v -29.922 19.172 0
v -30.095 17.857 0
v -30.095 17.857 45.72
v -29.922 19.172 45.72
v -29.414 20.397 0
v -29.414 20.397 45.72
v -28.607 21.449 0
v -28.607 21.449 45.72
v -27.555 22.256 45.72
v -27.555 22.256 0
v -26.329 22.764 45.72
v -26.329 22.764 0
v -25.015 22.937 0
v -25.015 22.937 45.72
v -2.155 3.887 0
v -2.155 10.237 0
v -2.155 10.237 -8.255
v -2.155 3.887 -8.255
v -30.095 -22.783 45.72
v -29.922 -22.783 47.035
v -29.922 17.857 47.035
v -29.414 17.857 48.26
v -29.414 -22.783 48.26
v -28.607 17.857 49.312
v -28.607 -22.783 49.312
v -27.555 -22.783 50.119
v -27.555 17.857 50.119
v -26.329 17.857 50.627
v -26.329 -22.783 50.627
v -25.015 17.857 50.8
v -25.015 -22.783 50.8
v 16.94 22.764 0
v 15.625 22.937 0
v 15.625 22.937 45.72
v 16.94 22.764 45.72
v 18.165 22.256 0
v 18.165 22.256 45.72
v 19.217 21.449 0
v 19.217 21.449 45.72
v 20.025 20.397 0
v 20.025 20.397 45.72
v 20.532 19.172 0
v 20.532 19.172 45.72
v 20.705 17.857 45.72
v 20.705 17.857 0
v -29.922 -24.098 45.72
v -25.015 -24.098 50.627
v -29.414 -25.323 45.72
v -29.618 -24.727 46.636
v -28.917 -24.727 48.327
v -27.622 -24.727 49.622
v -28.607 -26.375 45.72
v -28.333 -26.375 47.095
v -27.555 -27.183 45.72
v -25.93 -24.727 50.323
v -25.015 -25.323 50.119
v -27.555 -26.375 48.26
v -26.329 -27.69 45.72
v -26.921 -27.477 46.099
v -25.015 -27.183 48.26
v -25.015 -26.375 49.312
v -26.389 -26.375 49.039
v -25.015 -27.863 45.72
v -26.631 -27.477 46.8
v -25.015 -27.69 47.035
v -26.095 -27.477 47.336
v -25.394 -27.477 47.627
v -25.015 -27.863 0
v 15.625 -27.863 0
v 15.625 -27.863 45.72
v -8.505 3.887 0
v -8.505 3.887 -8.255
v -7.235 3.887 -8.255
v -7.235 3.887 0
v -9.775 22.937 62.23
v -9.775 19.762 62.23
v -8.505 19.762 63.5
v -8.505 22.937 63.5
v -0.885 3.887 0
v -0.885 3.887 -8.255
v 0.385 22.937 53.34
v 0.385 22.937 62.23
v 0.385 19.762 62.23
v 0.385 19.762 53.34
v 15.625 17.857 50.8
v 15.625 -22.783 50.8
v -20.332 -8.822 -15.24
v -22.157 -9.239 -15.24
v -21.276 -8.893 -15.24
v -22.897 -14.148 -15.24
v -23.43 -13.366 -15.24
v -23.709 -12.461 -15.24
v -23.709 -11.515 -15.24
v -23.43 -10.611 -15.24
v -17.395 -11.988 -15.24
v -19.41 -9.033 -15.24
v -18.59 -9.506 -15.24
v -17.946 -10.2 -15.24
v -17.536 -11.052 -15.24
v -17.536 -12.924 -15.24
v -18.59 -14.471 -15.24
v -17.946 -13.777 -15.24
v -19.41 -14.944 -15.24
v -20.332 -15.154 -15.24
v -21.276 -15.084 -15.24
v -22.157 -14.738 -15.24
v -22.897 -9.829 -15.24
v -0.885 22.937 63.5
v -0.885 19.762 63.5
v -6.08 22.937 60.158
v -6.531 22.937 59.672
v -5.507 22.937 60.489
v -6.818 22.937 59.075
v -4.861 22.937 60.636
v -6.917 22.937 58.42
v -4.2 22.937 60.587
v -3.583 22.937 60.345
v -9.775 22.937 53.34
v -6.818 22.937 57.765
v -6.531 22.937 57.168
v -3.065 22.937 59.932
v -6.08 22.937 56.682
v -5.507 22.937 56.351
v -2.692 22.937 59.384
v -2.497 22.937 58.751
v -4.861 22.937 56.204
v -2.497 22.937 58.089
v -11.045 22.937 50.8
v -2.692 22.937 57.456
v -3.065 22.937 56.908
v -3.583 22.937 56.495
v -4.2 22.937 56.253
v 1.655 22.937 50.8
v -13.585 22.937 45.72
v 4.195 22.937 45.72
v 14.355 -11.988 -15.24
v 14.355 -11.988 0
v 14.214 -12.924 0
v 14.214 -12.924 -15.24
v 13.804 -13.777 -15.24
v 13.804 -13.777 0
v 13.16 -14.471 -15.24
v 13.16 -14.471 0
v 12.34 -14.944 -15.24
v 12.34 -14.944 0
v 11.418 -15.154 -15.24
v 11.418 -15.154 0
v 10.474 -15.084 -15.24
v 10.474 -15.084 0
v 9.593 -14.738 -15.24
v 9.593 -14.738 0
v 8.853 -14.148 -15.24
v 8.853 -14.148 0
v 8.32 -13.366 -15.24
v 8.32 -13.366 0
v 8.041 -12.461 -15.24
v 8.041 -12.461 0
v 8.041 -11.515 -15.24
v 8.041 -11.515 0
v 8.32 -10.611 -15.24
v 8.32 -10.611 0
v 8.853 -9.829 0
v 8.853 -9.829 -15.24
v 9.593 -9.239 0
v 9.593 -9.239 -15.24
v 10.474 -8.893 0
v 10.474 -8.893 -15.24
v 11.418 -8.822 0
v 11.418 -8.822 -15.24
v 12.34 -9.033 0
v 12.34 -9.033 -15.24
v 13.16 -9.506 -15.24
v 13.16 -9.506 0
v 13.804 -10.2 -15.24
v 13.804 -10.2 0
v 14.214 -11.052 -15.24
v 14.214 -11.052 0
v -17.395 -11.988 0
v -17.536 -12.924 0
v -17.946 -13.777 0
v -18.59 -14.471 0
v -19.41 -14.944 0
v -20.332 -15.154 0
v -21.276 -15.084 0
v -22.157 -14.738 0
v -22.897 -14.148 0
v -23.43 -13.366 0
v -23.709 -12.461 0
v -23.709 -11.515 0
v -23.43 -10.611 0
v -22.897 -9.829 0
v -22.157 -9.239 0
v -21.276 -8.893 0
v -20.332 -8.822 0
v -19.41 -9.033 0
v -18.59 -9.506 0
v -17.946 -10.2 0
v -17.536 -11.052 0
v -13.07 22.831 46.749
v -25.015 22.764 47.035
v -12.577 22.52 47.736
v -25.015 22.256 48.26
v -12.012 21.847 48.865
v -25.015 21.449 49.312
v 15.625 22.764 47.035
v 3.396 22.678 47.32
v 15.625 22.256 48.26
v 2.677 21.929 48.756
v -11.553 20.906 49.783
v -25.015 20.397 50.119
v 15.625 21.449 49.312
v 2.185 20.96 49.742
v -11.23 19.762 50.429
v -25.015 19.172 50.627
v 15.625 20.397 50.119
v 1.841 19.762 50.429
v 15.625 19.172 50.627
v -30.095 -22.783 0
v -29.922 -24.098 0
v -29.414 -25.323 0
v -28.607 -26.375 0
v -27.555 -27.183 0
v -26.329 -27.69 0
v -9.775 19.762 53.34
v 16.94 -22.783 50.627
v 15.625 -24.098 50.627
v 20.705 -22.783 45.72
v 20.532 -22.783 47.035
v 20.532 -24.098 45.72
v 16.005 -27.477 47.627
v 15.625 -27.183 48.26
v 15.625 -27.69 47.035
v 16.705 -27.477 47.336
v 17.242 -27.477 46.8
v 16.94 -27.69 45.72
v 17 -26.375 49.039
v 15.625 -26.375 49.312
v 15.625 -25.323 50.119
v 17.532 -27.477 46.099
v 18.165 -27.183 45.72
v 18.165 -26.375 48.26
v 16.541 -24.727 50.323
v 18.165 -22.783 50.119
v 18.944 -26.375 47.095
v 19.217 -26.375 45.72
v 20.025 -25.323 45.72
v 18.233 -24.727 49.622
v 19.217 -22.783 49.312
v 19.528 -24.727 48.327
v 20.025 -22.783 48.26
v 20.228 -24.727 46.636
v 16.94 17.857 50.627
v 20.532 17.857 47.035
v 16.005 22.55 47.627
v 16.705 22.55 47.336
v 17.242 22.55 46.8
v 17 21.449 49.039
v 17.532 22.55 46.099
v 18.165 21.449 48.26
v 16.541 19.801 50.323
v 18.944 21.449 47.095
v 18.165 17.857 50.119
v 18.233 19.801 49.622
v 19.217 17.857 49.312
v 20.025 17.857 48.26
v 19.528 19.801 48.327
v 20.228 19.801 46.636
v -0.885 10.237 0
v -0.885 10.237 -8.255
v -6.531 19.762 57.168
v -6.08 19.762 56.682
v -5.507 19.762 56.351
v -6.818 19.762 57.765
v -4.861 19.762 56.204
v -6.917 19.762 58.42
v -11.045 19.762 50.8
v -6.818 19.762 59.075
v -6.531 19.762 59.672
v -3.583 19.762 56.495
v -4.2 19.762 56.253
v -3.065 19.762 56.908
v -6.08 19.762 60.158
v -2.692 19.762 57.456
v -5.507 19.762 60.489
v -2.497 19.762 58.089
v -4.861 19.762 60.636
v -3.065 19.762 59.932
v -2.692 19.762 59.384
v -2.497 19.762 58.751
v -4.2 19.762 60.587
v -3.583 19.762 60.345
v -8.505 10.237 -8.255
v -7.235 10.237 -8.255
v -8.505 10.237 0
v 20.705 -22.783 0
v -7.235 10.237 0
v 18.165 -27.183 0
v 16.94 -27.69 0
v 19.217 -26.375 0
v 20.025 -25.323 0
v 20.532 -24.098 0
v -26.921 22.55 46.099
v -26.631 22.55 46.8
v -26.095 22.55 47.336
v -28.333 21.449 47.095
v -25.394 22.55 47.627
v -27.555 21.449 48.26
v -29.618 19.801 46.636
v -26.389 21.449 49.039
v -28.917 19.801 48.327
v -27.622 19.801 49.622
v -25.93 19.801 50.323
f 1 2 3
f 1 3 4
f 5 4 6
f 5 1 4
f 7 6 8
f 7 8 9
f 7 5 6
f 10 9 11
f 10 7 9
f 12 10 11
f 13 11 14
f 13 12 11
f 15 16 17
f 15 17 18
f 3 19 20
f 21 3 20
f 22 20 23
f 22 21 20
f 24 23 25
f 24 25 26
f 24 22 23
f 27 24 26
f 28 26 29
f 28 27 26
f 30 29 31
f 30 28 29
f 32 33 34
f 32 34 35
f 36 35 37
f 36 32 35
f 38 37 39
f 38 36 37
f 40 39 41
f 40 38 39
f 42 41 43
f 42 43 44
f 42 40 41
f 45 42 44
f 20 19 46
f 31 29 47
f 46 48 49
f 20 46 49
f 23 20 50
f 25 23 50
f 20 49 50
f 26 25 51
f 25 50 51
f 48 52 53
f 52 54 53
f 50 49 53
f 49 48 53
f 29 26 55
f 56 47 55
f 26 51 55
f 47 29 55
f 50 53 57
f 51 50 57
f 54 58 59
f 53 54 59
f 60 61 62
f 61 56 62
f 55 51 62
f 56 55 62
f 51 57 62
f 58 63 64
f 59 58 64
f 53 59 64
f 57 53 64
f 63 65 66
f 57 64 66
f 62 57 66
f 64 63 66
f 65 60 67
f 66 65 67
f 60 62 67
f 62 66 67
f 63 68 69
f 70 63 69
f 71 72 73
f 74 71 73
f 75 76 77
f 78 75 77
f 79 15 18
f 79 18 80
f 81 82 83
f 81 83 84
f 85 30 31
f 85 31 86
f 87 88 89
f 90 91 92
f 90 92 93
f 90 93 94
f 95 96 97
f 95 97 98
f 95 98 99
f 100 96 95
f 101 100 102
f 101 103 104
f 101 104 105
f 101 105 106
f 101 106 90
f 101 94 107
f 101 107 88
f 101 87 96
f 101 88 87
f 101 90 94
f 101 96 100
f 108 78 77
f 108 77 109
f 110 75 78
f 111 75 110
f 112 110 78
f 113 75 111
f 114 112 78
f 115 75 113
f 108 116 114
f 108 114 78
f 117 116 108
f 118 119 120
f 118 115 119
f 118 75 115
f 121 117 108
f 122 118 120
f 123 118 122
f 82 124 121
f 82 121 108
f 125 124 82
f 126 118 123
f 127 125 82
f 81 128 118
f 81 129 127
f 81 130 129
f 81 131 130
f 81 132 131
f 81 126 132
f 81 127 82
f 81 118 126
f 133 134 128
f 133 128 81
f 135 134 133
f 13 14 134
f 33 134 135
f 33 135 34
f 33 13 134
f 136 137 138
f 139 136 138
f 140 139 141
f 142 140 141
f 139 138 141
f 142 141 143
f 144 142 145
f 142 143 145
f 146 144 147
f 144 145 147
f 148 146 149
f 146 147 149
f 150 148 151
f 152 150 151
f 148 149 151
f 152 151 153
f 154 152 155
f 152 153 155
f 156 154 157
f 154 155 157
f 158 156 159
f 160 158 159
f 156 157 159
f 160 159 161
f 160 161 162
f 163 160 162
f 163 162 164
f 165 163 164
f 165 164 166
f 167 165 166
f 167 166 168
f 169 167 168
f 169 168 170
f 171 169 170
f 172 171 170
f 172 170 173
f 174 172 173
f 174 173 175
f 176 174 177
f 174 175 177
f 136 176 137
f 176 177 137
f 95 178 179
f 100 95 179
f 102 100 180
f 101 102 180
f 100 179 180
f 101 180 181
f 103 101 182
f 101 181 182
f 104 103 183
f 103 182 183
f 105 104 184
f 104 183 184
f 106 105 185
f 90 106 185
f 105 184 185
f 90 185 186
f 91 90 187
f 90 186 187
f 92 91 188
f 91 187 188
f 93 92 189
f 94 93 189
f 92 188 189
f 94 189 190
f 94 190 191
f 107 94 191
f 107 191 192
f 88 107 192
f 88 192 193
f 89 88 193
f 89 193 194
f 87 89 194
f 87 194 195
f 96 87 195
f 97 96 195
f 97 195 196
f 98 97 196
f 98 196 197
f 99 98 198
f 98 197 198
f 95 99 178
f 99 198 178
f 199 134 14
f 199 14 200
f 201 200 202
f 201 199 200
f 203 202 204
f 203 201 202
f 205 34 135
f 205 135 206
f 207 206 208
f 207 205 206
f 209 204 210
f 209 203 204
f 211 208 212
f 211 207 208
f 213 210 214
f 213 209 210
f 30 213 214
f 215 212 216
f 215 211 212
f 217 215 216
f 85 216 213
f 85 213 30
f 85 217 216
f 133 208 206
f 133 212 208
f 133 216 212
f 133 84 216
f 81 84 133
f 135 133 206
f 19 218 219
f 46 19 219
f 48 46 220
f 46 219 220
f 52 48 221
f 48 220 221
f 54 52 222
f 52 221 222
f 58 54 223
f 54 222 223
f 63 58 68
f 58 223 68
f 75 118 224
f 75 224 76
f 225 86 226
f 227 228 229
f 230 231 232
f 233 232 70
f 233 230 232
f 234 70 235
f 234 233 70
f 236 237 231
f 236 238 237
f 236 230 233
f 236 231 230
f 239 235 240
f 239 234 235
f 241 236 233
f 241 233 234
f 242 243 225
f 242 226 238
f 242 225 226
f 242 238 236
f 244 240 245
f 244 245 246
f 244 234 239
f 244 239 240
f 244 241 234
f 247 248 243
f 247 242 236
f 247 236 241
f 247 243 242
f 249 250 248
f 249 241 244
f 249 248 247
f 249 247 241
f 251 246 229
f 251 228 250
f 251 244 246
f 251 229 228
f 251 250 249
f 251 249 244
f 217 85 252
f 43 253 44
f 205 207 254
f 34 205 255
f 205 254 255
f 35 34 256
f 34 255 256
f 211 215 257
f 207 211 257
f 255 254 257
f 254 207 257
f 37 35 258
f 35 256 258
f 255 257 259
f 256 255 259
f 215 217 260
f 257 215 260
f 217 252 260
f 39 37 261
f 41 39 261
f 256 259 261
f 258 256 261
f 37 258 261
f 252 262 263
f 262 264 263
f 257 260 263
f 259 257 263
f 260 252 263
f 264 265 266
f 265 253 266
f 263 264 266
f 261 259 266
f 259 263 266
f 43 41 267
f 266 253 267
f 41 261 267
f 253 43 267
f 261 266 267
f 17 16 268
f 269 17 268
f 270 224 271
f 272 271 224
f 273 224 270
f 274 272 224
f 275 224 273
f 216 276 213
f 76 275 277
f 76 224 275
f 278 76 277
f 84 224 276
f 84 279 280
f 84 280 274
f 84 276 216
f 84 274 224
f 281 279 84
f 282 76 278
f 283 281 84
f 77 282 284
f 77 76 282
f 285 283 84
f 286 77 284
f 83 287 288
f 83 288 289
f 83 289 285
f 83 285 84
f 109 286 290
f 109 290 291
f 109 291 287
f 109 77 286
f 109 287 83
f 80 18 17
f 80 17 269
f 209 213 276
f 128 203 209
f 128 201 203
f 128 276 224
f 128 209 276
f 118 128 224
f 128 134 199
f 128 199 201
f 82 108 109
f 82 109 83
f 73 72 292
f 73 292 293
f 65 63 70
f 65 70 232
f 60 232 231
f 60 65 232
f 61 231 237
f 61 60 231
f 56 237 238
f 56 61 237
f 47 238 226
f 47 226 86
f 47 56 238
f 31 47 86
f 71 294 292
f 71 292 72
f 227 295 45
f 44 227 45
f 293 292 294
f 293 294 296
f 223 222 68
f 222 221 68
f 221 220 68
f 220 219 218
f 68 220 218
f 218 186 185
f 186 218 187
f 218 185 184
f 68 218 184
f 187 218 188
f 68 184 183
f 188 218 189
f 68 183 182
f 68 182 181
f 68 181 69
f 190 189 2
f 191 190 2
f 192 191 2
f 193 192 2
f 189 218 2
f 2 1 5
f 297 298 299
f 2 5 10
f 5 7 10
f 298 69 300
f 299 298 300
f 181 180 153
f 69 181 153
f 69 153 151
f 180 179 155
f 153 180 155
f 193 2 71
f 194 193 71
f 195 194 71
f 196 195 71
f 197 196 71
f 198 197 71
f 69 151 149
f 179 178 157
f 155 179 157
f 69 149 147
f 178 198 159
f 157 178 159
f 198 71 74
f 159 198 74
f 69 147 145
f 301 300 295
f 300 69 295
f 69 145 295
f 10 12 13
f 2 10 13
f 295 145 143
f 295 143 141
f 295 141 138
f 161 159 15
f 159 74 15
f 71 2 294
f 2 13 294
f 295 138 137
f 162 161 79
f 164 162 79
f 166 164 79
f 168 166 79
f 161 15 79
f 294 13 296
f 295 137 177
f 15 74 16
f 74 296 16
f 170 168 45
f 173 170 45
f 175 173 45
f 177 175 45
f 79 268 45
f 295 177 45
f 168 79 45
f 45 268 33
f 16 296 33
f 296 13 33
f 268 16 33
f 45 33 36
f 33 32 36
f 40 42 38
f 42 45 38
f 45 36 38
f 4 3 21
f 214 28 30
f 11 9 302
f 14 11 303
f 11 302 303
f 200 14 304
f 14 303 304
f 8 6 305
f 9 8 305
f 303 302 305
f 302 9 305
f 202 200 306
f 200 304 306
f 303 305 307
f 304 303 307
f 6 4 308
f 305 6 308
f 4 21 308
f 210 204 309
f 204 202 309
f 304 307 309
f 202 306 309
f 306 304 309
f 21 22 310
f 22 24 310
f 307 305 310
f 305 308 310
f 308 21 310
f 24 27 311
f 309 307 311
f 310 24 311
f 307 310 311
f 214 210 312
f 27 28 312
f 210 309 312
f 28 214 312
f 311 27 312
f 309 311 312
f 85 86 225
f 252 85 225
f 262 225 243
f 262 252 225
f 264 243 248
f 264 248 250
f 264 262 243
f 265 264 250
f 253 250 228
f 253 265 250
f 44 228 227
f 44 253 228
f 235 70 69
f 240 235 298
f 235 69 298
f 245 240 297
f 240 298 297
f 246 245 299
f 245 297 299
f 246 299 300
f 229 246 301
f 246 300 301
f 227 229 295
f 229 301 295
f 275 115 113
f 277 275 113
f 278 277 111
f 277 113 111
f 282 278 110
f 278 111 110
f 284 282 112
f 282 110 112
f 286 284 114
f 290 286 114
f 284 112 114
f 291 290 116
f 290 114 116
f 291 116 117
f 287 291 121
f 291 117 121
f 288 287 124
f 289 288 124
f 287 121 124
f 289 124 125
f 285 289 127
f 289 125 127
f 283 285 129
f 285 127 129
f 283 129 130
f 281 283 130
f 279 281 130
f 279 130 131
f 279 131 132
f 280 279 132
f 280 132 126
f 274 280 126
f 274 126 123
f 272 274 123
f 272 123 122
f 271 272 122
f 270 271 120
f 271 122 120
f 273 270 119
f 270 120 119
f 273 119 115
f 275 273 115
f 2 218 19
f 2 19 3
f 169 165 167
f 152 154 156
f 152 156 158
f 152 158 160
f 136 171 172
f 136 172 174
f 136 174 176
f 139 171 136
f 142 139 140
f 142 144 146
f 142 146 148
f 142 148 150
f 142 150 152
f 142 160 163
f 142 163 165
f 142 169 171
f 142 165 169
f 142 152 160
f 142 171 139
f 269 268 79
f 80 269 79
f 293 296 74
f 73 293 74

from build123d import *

# Parameters (mm, degrees)
F0_W         = 50.8
F0_H         = 50.8
F1_DEPTH     = 50.8
F2_R         = 2.2225
F3_DEPTH     = 3.175
F5_R         = 5.08
F6_T1_DEPTH  = 40.64
F6_T3_DEPTH  = 58.42
F6_T6_ANGLE  = 90
F6_T10_DEPTH = 26.67
F6_T16_DEPTH = 26.67
F6_T22_DEPTH = 26.67
F6_T27_ANGLE = 90
F6_T31_DEPTH = 26.67
F6_T38_DEPTH = 26.67
F6_T44_DEPTH = 26.67
F6_T48_ANGLE = 90
F6_T50_ANGLE = 90
F7_R         = 3.175
F8_DEPTH     = 15.24
F7_W         = 1.27
F7_H         = 6.35
F9_DEPTH     = 8.255


# Not quite as in the source:
# - a fillet or chamfer that OpenCascade refuses, or shapes differently, is made with other operations: its cross-section is extruded or revolved along the edge and cut away or added
# - a feature of the source that left no trace in its solid (it failed there, or was rolled back) is left out


with BuildPart() as f1:
    # F0 (on Top) → F1 (new body)
    with BuildSketch(Plane.XY):
        with Locations((-4.6946440548, -2.4632510453)):
            Rectangle(F0_W, F0_H)
    extrude(amount=F1_DEPTH)

    # F2 (on face) → F3 (join)
    with BuildSketch(Plane(origin=(0, 22.9367489547, 0), x_dir=(-1, 0, 0), z_dir=(0, 1, 0))):
        Polygon((-0.3853559452, 62.23), (-0.3853559452, 53.34), (9.7746440548, 53.34), (9.7746440548, 62.23), (8.5046440548, 63.5), (0.8846440548, 63.5), align=None)
        with Locations((4.6946440548, 58.42)):
            Circle(F2_R, mode=Mode.SUBTRACT)
        Polygon((-0.3853559452, 53.34), (-1.6553559452, 50.8), (11.0446440548, 50.8), (9.7746440548, 53.34), align=None)
    extrude(amount=-F3_DEPTH)

    # F5
    f5_edges = [f1.edges().sort_by_distance(p)[0] for p in [
        (-30.094644, -2.463251, 50.8),
        (20.705356, -2.463251, 50.8),
    ]]
    fillet(f5_edges, radius=F5_R)

    # F6: fillet of radius 5.08 on 11 edges, made by hand

    # F6_s2 → F6_t1 (cut)
    with BuildSketch(Plane.YZ.offset(-25.0146440548)):
        with BuildLine():
            ThreePointArc((-27.8632510453, 45.72), (-26.3753534938, 49.3121024484), (-22.7832510453, 50.8))
            Line((-22.7832510453, 50.8), (-27.8632510453, 50.8))
            Line((-27.8632510453, 50.8), (-27.8632510453, 45.72))
        make_face()
    extrude(amount=F6_T1_DEPTH, mode=Mode.SUBTRACT)

    # F6_s4 → F6_t3 (cut)
    with BuildSketch(Plane.XY.offset(-12.7)):
        with BuildLine():
            ThreePointArc((-30.0946440548, 17.8567489547), (-28.6067465032, 21.4488514031), (-25.0146440548, 22.9367489547))
            Line((-25.0146440548, 22.9367489547), (-30.0946440548, 22.9367489547))
            Line((-30.0946440548, 22.9367489547), (-30.0946440548, 17.8567489547))
        make_face()
        with BuildLine():
            ThreePointArc((-30.0946440548, -22.7832510453), (-28.6067465032, -26.3753534938), (-25.0146440548, -27.8632510453))
            Line((-25.0146440548, -27.8632510453), (-30.0946440548, -27.8632510453))
            Line((-30.0946440548, -27.8632510453), (-30.0946440548, -22.7832510453))
        make_face()
        with BuildLine():
            ThreePointArc((15.6253559452, 22.9367489547), (19.2174583937, 21.4488514031), (20.7053559452, 17.8567489547))
            Line((20.7053559452, 17.8567489547), (20.7053559452, 22.9367489547))
            Line((20.7053559452, 22.9367489547), (15.6253559452, 22.9367489547))
        make_face()
        with BuildLine():
            ThreePointArc((15.6253559452, -27.8632510453), (19.2174583937, -26.3753534938), (20.7053559452, -22.7832510453))
            Line((20.7053559452, -22.7832510453), (20.7053559452, -27.8632510453))
            Line((20.7053559452, -27.8632510453), (15.6253559452, -27.8632510453))
        make_face()
    extrude(amount=F6_T3_DEPTH, mode=Mode.SUBTRACT)

    # F6_s5 → F6_t6 (revolve, cut)
    with BuildSketch(Plane.YZ.offset(15.6253559452)):
        with BuildLine():
            ThreePointArc((22.9367489547, 45.72), (21.4488514031, 49.3121024484), (17.8567489547, 50.8))
            Line((17.8567489547, 50.8), (22.9367489547, 50.8))
            Line((22.9367489547, 50.8), (22.9367489547, 45.72))
        make_face()
    revolve(axis=Axis((15.6253559452, 22.9367489547, 45.72), (0, 1, 0)), revolution_arc=F6_T6_ANGLE, mode=Mode.SUBTRACT)


with BuildPart() as f6_tool8:
    # F6_s9 → F6_t10 (new body)
    with BuildSketch(Plane.YZ.offset(15.6253559452)):
        with BuildLine():
            ThreePointArc((22.9367489547, 45.72), (21.4488514031, 49.3121024484), (17.8567489547, 50.8))
            Line((17.8567489547, 50.8), (22.9367489547, 50.8))
            Line((22.9367489547, 50.8), (22.9367489547, 45.72))
        make_face()
    extrude(amount=-F6_T10_DEPTH)

    split(bisect_by=Plane.XZ.offset(-19.7617489547), keep=Keep.BOTTOM)

    split(bisect_by=Plane(origin=(21.6442847562, 0, 10.8221423781), x_dir=(0, 1, 0), z_dir=(0.894427191, 0, 0.4472135955)), keep=Keep.TOP)


with BuildPart() as f1_1:
    add(f1.part)

    # F6_t7: cut F6_tool8
    add(f6_tool8.part, mode=Mode.SUBTRACT)


with BuildPart() as f6_tool14:
    # F6_s15 → F6_t16 (new body)
    with BuildSketch(Plane.YZ.offset(15.6253559452)):
        with BuildLine():
            ThreePointArc((22.9367489547, 45.72), (21.4488514031, 49.3121024484), (17.8567489547, 50.8))
            Line((17.8567489547, 50.8), (22.9367489547, 50.8))
            Line((22.9367489547, 50.8), (22.9367489547, 45.72))
        make_face()
    extrude(amount=-F6_T16_DEPTH)

    split(bisect_by=Plane.XZ.offset(-19.7617489547), keep=Keep.TOP)

    split(bisect_by=Plane(origin=(21.6442847562, 0, 10.8221423781), x_dir=(0, 1, 0), z_dir=(0.894427191, 0, 0.4472135955)), keep=Keep.TOP)


with BuildPart() as f1_2:
    add(f1_1.part)

    # F6_t13: cut F6_tool14
    add(f6_tool14.part, mode=Mode.SUBTRACT)


with BuildPart() as f6_tool20:
    # F6_s21 → F6_t22 (new body)
    with BuildSketch(Plane.YZ.offset(15.6253559452)):
        with BuildLine():
            ThreePointArc((22.9367489547, 45.72), (21.4488514031, 49.3121024484), (17.8567489547, 50.8))
            Line((17.8567489547, 50.8), (22.9367489547, 50.8))
            Line((22.9367489547, 50.8), (22.9367489547, 45.72))
        make_face()
    extrude(amount=-F6_T22_DEPTH)

    split(bisect_by=Plane(origin=(-29.1557152438, 0, 14.5778576219), x_dir=(0, 1, 0), z_dir=(0.894427191, 0, -0.4472135955)), keep=Keep.TOP)

    split(bisect_by=Plane.XZ.offset(-19.7617489547), keep=Keep.TOP)

    split(bisect_by=Plane(origin=(21.6442847562, 0, 10.8221423781), x_dir=(0, 1, 0), z_dir=(-0.894427191, 0, -0.4472135955)), keep=Keep.TOP)


with BuildPart() as f1_3:
    add(f1_2.part)

    # F6_t19: cut F6_tool20
    add(f6_tool20.part, mode=Mode.SUBTRACT)

    # F6_s26 → F6_t27 (revolve, cut)
    with BuildSketch(Plane.XY.offset(45.72)):
        with BuildLine():
            ThreePointArc((-25.0146440548, 22.9367489547), (-28.6067465032, 21.4488514031), (-30.0946440548, 17.8567489547))
            Line((-30.0946440548, 17.8567489547), (-30.0946440548, 22.9367489547))
            Line((-30.0946440548, 22.9367489547), (-25.0146440548, 22.9367489547))
        make_face()
    revolve(axis=Axis((-25.0146440548, 22.9367489547, 45.72), (0, 1, 0)), revolution_arc=F6_T27_ANGLE, mode=Mode.SUBTRACT)


with BuildPart() as f6_tool29:
    # F6_s30 → F6_t31 (new body)
    with BuildSketch(Plane.YZ.offset(1.6553559452)):
        with BuildLine():
            ThreePointArc((22.9367489547, 45.72), (21.4488514031, 49.3121024484), (17.8567489547, 50.8))
            Line((17.8567489547, 50.8), (22.9367489547, 50.8))
            Line((22.9367489547, 50.8), (22.9367489547, 45.72))
        make_face()
    extrude(amount=-F6_T31_DEPTH)

    split(bisect_by=Plane(origin=(-29.1557152438, 0, 14.5778576219), x_dir=(0, 1, 0), z_dir=(0.894427191, 0, -0.4472135955)), keep=Keep.TOP)

    split(bisect_by=Plane.XZ.offset(-19.7617489547), keep=Keep.TOP)

    split(bisect_by=Plane(origin=(21.6442847562, 0, 10.8221423781), x_dir=(0, 1, 0), z_dir=(-0.894427191, 0, -0.4472135955)), keep=Keep.TOP)


with BuildPart() as f1_4:
    add(f1_3.part)

    # F6_t28: cut F6_tool29
    add(f6_tool29.part, mode=Mode.SUBTRACT)


with BuildPart() as f6_tool36:
    # F6_s37 → F6_t38 (new body)
    with BuildSketch(Plane.YZ.offset(1.6553559452)):
        with BuildLine():
            ThreePointArc((22.9367489547, 45.72), (21.4488514031, 49.3121024484), (17.8567489547, 50.8))
            Line((17.8567489547, 50.8), (22.9367489547, 50.8))
            Line((22.9367489547, 50.8), (22.9367489547, 45.72))
        make_face()
    extrude(amount=-F6_T38_DEPTH)

    split(bisect_by=Plane(origin=(-29.1557152438, 0, 14.5778576219), x_dir=(0, 1, 0), z_dir=(-0.894427191, 0, 0.4472135955)), keep=Keep.TOP)

    split(bisect_by=Plane.XZ.offset(-19.7617489547), keep=Keep.BOTTOM)


with BuildPart() as f1_5:
    add(f1_4.part)

    # F6_t35: cut F6_tool36
    add(f6_tool36.part, mode=Mode.SUBTRACT)


with BuildPart() as f6_tool42:
    # F6_s43 → F6_t44 (new body)
    with BuildSketch(Plane.YZ.offset(1.6553559452)):
        with BuildLine():
            ThreePointArc((22.9367489547, 45.72), (21.4488514031, 49.3121024484), (17.8567489547, 50.8))
            Line((17.8567489547, 50.8), (22.9367489547, 50.8))
            Line((22.9367489547, 50.8), (22.9367489547, 45.72))
        make_face()
    extrude(amount=-F6_T44_DEPTH)

    split(bisect_by=Plane(origin=(-29.1557152438, 0, 14.5778576219), x_dir=(0, 1, 0), z_dir=(-0.894427191, 0, 0.4472135955)), keep=Keep.TOP)

    split(bisect_by=Plane.XZ.offset(-19.7617489547), keep=Keep.TOP)


with BuildPart() as f1_6:
    add(f1_5.part)

    # F6_t41: cut F6_tool42
    add(f6_tool42.part, mode=Mode.SUBTRACT)

    # F6_s47 → F6_t48 (revolve, cut)
    with BuildSketch(Plane.XY.offset(45.72)):
        with BuildLine():
            ThreePointArc((-30.0946440548, -22.7832510453), (-28.6067465032, -26.3753534938), (-25.0146440548, -27.8632510453))
            Line((-25.0146440548, -27.8632510453), (-30.0946440548, -27.8632510453))
            Line((-30.0946440548, -27.8632510453), (-30.0946440548, -22.7832510453))
        make_face()
    revolve(axis=Axis((-25.0146440548, -27.8632510453, 45.72), (0, 1, 0)), revolution_arc=F6_T48_ANGLE, mode=Mode.SUBTRACT)

    # F6_s49 → F6_t50 (revolve, cut)
    with BuildSketch(Plane.YZ.offset(15.6253559452)):
        with BuildLine():
            ThreePointArc((-27.8632510453, 45.72), (-26.3753534938, 49.3121024484), (-22.7832510453, 50.8))
            Line((-22.7832510453, 50.8), (-27.8632510453, 50.8))
            Line((-27.8632510453, 50.8), (-27.8632510453, 45.72))
        make_face()
    revolve(axis=Axis((15.6253559452, -27.8632510453, 45.72), (0, 1, 0)), revolution_arc=F6_T50_ANGLE, mode=Mode.SUBTRACT)

    # F7 (on face) → F8 (join)
    with BuildSketch(Plane(origin=(0, 0, 0), x_dir=(1, 0, 0), z_dir=(0, 0, -1))):
        with Locations((-20.5696440548, 11.9882510453)):
            Circle(F7_R)
        with Locations((11.1803559452, 11.9882510453)):
            Circle(F7_R)
    extrude(amount=F8_DEPTH)

    # F7 (on face) → F9 (join)
    with BuildSketch(Plane(origin=(0, 0, 0), x_dir=(1, 0, 0), z_dir=(0, 0, -1))):
        with Locations((-7.8696440548, -7.0617489547)):
            Rectangle(F7_W, F7_H)
        with Locations((-1.5196440548, -7.0617489547)):
            Rectangle(F7_W, F7_H)
    extrude(amount=F9_DEPTH)


solid = f1_6.part
